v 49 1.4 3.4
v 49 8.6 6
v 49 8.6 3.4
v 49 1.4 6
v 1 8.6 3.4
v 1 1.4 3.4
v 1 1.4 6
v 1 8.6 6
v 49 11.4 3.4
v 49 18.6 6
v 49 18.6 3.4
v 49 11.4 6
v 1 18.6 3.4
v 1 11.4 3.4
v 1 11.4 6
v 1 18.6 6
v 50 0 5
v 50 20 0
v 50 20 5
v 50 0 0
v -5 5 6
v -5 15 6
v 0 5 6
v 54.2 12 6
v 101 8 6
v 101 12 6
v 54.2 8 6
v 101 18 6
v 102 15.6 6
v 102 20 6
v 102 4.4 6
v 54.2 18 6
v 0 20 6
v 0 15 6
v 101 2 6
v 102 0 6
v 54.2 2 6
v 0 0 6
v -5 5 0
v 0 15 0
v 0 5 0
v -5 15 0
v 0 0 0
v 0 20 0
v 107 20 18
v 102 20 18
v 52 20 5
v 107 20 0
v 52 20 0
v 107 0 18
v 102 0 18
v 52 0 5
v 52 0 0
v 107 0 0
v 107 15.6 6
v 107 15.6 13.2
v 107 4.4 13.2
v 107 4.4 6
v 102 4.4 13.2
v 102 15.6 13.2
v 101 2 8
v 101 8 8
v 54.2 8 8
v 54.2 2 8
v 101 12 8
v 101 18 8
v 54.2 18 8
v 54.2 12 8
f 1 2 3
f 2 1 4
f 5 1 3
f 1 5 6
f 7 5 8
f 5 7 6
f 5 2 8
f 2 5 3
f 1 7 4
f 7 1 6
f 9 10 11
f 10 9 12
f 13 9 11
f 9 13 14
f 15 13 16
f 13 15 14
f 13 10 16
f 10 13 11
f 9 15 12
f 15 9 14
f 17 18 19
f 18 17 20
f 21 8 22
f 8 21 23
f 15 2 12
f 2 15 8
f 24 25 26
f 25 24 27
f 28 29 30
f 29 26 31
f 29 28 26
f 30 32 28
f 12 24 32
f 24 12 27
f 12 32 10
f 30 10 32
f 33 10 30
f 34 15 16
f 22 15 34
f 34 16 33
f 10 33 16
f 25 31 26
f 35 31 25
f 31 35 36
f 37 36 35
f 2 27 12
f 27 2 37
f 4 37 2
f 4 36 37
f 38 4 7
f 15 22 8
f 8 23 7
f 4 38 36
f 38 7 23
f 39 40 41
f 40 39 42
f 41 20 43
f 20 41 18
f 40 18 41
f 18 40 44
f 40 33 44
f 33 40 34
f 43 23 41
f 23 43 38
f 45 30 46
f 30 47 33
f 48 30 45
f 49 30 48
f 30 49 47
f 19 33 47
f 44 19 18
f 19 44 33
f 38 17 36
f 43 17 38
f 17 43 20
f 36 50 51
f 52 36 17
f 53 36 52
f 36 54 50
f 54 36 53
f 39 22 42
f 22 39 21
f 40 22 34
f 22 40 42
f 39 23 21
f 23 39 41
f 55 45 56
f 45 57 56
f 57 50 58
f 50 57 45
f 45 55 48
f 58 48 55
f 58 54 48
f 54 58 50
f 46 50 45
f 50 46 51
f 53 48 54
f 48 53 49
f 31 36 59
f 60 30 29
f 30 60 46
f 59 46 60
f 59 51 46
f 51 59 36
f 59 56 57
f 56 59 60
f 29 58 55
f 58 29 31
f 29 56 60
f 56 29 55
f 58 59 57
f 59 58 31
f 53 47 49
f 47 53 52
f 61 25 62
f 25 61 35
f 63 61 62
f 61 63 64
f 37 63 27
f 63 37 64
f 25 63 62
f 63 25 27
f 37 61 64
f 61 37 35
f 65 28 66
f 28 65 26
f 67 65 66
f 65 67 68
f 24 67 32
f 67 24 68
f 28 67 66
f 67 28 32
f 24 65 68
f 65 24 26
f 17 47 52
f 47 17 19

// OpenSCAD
//distance between parts
distb = 2;

//length of part
le = 50;

//width of part
wi = 20;

//height of top part
he = 6;

//ridge height
rihe = 2;

//ridge width
riwi = 6;

//padding
p = 1;

//give between ridges and holes
g = .6;

//connection height
cohe = 1;

//thingy length
thle = 5;

//thingy width
thwi = 10;

//fastener give
fagi = .6;


module top()
{

  difference()
  {
    cube([le,wi,he]);

    //ridge holes
    union()
    {
      translate([p,2*p-g,he-rihe-g])
      cube([le-2*p,riwi+2*g,he+1]);

      translate([p,wi-2*p-g-riwi,he-rihe-g])
      cube([le-2*p,riwi+2*g,he+1]);
    }
  }

//fastener thingy
translate([-thle,wi/2-thwi/2,0])
cube([thle,thwi,he]);

}

module bottom()
{
translate([distb+le,0,0])
cube([le,wi,he]);

//ridges
translate([distb+le+p+2*g,2*p,he])
cube([le-2*p-2*g,riwi,rihe]);

translate([distb+le+p+2*g,wi-riwi-2*p,he])
cube([le-2*p-2*g,riwi,rihe]);


//fastener thingy
difference()
{
  translate([2*le+distb,0,0])
  cube([thle,wi,he*3]);

  translate([2*le+distb-1,wi/2-thwi/2-fagi,he])
  cube([thle*2,thwi+2*fagi,he+2*fagi]);
}
}

module connection()
{
  translate([le,0,he-cohe])
  cube([2,wi,cohe]);
}

top();
bottom();
connection();
